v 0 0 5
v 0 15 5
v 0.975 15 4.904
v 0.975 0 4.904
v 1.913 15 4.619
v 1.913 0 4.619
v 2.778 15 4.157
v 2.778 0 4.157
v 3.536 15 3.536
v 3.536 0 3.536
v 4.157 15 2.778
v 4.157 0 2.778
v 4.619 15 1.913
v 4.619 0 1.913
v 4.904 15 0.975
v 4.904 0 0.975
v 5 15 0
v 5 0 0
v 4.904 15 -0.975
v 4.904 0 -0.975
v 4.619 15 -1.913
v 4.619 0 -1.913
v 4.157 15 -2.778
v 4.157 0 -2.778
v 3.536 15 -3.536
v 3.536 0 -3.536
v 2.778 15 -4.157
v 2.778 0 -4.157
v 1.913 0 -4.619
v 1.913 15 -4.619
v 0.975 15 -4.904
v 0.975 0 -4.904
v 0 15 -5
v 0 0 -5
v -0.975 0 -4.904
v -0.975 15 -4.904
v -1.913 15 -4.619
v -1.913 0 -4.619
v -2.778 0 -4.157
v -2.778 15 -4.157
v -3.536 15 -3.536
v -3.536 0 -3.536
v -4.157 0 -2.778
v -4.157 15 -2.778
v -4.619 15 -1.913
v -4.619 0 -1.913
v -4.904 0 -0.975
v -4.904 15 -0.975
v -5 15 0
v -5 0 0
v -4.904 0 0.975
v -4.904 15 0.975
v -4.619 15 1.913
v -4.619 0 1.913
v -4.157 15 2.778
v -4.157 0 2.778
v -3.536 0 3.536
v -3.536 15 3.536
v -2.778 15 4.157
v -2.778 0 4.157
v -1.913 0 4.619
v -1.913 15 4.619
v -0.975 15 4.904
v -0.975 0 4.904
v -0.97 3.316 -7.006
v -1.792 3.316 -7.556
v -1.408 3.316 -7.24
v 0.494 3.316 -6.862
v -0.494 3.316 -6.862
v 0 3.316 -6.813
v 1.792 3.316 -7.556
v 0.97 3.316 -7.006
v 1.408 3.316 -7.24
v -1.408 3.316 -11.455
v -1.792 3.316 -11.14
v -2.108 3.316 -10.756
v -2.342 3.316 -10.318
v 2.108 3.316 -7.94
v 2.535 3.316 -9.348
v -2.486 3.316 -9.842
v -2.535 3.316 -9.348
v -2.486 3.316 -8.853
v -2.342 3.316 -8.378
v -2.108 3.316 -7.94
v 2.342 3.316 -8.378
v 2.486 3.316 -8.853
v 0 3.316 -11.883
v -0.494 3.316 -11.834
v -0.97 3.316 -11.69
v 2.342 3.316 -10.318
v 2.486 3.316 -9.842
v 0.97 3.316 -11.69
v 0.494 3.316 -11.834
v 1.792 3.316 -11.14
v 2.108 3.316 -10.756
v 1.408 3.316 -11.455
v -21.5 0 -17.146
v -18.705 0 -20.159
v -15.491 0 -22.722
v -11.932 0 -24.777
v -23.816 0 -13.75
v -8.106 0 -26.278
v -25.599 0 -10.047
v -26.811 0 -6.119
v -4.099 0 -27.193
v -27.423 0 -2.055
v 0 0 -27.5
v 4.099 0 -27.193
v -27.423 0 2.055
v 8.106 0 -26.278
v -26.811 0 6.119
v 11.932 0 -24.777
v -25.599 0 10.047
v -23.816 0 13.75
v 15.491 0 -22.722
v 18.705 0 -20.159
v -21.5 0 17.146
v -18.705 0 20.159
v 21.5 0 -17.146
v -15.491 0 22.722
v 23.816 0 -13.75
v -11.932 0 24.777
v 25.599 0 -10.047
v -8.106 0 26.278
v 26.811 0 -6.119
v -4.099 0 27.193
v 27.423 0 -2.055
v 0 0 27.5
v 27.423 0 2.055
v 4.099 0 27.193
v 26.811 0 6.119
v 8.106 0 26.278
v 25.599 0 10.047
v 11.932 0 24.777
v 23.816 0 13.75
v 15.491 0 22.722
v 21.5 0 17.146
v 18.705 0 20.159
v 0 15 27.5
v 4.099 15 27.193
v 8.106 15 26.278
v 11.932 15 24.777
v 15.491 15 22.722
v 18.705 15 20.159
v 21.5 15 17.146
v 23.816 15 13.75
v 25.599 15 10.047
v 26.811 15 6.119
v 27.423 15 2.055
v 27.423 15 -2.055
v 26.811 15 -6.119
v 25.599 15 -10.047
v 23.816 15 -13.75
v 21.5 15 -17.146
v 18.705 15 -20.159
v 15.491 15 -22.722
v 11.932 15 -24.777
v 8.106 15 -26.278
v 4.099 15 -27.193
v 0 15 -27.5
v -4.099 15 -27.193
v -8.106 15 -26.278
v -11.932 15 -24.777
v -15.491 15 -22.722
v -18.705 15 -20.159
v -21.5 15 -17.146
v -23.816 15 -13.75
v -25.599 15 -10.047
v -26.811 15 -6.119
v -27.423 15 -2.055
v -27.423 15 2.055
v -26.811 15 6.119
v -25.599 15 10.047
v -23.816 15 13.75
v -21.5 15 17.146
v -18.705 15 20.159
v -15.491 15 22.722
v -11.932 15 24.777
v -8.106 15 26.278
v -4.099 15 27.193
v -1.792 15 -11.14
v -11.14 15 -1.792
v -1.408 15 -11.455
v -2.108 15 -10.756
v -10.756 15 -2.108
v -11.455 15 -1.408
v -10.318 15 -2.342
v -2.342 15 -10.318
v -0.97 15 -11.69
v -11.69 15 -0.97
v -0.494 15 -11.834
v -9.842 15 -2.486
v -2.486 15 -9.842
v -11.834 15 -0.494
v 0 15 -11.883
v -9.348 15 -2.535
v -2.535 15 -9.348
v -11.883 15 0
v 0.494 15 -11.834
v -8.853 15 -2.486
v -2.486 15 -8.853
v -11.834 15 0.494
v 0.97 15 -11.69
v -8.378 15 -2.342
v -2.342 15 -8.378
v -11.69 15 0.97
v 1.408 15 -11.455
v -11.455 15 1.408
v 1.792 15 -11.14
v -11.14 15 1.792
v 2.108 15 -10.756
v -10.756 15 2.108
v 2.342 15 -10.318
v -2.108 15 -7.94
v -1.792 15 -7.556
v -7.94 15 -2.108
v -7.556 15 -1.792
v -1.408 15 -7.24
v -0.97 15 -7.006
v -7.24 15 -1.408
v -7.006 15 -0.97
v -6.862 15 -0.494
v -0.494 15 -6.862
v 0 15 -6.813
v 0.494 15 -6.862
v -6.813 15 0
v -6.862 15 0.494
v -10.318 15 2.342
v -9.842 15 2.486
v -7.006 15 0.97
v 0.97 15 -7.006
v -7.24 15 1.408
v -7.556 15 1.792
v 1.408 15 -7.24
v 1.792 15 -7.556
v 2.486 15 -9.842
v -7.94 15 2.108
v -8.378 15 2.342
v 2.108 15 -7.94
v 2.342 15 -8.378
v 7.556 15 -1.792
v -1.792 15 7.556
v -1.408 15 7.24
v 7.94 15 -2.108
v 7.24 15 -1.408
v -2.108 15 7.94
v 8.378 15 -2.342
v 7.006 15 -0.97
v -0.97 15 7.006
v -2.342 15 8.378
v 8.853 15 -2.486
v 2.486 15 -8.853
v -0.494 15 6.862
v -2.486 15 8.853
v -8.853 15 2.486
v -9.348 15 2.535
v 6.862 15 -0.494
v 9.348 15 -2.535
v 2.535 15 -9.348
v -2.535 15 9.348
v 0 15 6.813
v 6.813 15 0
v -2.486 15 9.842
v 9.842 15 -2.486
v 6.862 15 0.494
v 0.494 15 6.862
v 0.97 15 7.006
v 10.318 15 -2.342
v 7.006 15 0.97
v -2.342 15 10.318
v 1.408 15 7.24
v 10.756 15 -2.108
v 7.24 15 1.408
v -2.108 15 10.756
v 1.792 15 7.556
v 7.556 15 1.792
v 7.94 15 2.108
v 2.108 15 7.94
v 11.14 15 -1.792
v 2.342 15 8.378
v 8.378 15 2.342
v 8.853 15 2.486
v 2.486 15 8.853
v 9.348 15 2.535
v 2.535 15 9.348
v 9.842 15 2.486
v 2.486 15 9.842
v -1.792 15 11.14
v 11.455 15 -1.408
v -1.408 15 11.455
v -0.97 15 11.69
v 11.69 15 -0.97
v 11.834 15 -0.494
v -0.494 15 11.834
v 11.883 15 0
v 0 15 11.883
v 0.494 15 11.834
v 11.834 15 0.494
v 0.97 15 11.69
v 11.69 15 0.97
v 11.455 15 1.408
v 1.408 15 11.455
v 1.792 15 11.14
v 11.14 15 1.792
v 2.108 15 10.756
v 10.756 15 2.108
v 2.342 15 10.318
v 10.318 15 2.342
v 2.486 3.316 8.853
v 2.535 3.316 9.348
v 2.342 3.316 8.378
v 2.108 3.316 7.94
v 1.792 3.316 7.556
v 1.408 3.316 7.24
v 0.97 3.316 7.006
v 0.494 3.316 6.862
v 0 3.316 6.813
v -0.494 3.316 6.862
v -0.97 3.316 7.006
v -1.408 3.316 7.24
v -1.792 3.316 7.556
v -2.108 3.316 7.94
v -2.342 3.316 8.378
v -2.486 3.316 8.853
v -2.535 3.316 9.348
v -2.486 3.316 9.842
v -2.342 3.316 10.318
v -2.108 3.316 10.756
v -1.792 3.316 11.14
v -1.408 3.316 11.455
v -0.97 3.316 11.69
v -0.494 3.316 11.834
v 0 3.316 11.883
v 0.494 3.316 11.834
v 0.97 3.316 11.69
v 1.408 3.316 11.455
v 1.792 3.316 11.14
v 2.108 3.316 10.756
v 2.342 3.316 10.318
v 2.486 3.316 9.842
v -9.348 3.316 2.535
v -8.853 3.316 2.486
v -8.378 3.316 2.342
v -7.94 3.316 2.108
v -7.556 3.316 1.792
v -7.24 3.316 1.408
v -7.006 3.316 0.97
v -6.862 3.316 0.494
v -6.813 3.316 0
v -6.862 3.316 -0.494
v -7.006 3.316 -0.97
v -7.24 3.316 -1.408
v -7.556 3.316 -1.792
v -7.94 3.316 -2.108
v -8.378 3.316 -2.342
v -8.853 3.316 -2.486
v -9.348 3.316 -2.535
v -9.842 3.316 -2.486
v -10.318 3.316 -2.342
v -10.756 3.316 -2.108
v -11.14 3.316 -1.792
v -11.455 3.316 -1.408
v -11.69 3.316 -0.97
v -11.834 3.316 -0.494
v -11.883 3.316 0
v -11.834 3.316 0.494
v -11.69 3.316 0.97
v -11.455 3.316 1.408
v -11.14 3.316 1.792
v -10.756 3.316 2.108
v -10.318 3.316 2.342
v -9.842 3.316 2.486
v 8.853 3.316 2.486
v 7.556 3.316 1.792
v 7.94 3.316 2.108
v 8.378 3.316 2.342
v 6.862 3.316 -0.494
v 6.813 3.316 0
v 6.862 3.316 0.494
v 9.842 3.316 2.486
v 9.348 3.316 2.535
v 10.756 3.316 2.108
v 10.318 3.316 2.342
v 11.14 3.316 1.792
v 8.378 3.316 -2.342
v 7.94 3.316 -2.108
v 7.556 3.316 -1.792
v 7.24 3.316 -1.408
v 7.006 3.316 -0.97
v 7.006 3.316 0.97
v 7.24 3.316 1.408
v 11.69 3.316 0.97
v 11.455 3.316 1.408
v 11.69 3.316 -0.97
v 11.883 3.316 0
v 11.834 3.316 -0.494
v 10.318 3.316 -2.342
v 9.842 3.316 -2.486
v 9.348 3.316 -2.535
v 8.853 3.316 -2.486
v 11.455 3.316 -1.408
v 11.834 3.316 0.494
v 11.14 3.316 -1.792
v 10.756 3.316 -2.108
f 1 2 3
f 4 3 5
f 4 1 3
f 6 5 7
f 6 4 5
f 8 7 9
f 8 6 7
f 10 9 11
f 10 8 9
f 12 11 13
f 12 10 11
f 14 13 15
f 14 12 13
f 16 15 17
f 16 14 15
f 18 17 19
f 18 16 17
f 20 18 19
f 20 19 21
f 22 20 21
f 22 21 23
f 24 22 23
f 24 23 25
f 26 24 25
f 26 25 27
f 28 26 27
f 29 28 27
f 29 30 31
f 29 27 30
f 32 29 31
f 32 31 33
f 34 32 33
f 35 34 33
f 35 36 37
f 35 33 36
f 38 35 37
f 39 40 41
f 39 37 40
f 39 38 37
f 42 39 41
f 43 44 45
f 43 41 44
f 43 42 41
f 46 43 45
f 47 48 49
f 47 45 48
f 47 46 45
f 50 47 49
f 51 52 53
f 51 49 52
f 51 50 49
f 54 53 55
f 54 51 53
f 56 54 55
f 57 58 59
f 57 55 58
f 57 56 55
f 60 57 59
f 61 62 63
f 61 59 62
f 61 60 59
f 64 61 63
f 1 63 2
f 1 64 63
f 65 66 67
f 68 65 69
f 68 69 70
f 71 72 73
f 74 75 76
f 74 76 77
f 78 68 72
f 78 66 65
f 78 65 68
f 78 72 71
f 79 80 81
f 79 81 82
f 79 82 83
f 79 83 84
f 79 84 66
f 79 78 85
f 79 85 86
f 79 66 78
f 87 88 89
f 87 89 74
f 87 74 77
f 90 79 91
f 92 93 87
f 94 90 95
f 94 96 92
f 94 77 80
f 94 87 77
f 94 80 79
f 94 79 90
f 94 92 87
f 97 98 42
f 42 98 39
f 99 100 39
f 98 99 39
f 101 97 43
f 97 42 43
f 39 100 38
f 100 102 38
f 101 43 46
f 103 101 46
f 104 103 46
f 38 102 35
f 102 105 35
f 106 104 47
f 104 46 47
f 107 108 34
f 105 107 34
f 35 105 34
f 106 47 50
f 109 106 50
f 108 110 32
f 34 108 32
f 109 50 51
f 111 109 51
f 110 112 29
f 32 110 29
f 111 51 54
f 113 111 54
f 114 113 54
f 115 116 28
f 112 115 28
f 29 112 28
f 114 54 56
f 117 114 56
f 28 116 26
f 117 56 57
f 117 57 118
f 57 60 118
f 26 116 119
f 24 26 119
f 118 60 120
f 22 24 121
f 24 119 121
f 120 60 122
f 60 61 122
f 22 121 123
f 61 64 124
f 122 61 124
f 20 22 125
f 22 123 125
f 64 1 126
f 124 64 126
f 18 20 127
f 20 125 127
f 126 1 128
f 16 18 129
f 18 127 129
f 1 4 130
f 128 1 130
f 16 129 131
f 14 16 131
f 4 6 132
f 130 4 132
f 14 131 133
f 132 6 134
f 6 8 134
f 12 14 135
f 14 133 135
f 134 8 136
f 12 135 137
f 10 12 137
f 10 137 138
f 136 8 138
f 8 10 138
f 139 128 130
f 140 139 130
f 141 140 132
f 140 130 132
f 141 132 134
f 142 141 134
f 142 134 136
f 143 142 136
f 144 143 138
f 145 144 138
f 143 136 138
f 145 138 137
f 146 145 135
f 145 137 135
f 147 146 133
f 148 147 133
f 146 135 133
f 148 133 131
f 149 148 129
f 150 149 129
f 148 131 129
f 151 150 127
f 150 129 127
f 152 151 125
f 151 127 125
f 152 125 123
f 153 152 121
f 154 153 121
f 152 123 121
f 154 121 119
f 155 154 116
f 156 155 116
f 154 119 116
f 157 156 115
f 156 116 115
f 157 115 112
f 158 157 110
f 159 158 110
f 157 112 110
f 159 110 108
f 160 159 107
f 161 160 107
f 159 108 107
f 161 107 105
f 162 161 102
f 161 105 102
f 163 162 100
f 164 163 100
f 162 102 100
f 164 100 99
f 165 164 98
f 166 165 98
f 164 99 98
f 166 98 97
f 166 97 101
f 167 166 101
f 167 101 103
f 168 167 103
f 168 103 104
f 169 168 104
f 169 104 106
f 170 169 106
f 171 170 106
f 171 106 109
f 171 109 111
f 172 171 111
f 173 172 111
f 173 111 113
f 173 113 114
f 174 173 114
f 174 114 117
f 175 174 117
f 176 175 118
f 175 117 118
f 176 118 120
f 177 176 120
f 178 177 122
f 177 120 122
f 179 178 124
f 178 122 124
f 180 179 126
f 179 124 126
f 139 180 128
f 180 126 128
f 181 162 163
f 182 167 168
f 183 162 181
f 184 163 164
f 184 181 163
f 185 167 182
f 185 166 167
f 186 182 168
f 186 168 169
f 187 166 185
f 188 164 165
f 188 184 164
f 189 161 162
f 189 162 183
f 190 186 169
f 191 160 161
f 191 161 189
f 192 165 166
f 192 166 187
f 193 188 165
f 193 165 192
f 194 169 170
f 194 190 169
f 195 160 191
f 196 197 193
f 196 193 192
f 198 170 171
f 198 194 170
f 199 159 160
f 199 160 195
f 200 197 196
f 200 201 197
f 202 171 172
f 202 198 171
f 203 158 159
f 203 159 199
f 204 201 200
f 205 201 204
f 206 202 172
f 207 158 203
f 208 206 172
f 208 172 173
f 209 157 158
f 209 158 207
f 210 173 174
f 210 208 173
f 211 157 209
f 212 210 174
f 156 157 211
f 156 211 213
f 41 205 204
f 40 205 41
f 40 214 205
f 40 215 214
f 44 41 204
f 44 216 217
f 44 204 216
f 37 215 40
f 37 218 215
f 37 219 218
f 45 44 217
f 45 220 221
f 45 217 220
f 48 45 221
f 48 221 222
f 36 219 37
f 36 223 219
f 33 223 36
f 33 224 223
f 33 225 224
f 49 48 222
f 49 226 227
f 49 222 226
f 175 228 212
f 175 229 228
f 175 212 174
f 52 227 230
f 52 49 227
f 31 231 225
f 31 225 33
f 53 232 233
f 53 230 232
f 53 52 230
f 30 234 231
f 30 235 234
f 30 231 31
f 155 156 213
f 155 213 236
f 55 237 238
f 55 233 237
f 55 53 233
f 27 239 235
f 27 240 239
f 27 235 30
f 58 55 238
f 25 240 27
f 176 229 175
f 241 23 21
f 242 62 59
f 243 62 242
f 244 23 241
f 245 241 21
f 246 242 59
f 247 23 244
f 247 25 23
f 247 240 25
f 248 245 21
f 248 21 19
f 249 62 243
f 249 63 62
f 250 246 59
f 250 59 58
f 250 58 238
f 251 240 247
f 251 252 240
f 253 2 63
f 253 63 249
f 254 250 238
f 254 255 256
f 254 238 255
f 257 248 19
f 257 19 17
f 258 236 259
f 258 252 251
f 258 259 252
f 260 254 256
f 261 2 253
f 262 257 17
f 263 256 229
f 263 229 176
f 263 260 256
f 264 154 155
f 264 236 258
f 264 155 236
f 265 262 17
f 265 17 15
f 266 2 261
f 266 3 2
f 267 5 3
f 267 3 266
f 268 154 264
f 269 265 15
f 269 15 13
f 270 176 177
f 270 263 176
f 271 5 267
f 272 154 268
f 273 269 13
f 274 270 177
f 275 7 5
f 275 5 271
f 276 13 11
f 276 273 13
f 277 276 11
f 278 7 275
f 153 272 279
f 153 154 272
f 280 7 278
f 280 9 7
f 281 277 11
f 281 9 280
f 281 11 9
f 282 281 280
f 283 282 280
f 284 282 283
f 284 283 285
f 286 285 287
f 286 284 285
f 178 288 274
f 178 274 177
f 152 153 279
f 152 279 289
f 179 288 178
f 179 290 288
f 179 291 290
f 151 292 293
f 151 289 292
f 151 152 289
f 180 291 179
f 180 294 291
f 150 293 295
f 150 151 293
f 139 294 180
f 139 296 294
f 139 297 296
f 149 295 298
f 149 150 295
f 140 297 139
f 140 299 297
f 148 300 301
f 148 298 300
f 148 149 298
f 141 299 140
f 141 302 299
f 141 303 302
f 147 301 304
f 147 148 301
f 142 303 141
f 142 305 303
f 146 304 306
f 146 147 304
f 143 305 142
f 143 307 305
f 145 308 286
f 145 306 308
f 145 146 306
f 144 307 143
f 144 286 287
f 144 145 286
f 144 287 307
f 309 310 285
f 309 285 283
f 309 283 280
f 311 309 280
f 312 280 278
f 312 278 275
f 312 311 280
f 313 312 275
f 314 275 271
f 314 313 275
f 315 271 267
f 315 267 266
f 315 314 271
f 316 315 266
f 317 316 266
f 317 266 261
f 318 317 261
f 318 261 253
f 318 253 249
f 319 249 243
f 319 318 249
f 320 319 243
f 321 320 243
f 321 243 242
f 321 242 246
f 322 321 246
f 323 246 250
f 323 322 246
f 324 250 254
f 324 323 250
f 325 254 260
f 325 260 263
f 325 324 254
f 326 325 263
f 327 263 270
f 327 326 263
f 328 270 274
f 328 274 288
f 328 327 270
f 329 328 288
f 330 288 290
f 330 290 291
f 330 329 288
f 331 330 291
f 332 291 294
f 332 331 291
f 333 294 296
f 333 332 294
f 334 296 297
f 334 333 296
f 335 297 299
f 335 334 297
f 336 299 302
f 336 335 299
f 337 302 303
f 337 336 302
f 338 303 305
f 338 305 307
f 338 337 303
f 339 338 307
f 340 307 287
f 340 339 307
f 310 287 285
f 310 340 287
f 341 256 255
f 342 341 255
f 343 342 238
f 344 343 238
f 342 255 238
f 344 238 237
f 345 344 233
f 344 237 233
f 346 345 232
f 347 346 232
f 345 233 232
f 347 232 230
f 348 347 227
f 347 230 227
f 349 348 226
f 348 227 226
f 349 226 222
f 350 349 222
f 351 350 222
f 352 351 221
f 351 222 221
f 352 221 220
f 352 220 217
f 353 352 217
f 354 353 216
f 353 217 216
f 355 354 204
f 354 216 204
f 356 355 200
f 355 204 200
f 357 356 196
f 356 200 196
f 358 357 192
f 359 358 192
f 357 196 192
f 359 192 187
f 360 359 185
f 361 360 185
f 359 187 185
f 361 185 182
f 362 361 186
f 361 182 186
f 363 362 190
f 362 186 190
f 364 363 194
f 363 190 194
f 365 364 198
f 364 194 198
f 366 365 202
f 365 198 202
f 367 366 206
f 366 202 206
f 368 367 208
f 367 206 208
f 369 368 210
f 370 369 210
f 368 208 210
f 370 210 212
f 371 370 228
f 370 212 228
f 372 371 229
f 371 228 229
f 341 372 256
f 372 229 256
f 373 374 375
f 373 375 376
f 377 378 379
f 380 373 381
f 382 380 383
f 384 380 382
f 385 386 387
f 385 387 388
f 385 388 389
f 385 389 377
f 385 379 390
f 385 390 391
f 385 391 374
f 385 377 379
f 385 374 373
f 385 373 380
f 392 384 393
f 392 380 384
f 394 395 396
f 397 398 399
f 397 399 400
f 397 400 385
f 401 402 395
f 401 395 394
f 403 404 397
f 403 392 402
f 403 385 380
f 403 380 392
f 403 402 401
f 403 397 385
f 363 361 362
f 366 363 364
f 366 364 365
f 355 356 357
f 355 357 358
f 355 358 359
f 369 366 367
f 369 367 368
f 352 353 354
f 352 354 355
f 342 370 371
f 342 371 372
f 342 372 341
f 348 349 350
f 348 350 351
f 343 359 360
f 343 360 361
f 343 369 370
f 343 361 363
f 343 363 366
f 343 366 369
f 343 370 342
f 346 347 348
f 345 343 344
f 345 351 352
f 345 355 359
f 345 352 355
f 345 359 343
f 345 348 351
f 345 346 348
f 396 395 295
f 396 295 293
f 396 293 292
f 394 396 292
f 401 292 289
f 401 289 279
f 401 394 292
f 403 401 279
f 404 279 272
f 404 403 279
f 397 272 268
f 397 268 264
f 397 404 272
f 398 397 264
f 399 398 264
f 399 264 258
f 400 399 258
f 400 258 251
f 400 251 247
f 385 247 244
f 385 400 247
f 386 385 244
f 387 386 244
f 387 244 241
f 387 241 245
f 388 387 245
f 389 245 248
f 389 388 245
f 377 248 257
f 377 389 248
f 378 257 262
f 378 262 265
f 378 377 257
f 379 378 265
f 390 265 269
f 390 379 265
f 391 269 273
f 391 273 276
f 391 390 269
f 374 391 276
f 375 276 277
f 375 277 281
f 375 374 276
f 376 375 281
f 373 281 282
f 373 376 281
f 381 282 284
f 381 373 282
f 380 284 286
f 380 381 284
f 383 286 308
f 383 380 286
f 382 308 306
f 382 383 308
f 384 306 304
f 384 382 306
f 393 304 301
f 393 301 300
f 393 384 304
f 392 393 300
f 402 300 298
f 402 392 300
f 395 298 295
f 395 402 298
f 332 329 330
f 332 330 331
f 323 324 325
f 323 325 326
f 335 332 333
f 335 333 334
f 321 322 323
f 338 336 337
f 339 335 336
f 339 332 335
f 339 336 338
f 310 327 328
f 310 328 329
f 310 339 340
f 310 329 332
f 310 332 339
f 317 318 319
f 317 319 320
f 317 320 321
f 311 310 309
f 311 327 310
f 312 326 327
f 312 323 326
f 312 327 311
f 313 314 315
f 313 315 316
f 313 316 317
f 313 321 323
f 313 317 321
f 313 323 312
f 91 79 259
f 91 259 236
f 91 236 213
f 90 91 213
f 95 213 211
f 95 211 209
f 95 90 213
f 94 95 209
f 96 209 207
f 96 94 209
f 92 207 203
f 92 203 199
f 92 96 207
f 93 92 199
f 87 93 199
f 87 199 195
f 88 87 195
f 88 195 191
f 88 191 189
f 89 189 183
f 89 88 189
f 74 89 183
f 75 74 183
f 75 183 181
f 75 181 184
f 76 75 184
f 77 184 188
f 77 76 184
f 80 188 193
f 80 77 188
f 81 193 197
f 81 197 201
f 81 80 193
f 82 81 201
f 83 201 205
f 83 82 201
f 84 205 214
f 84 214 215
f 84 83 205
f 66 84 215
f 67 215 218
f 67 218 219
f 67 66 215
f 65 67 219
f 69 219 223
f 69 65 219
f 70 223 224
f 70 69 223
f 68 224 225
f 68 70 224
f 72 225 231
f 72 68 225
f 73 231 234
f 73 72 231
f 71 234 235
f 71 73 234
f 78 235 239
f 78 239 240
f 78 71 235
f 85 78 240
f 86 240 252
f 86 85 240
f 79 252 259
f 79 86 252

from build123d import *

# Parameters (mm, degrees)
SKETCH1_R           = 27.5
BOSS_EXTRUDE1_DEPTH = 15
SKETCH2_R           = 5
CUT_EXTRUDE1_DEPTH  = 42.683330001
SKETCH3_R           = 2.534672143
CUT_EXTRUDE2_DEPTH  = 11.683898907
CIRPATTERN1_COUNT   = 4


with BuildPart() as part:
    # Sketch1 → Boss-Extrude1 (new body)
    with BuildSketch(Plane(origin=(0, 0, 0), x_dir=(1, 0, 0), z_dir=(0, 1, 0))):
        Circle(SKETCH1_R)
    extrude(amount=BOSS_EXTRUDE1_DEPTH)

    # Sketch2 → Cut-Extrude1 (cut, through all)
    with BuildSketch(Plane(origin=(0, 0, 0), x_dir=(1, 0, 0), z_dir=(0, 1, 0))):
        Circle(SKETCH2_R)
    extrude(amount=CUT_EXTRUDE1_DEPTH, mode=Mode.SUBTRACT)

    # Sketch3 → Cut-Extrude2 (cut)
    with BuildSketch(Plane(origin=(0, 15, 0), x_dir=(1, 0, 0), z_dir=(0, 1, 0))):
        with Locations((-9.347834619, 0)):
            Circle(SKETCH3_R)
    cut_extrude2 = extrude(amount=-CUT_EXTRUDE2_DEPTH, mode=Mode.SUBTRACT)

    # CirPattern1: Cut-Extrude2 ×4 about axis
    cirpattern1_axis = Axis((0, 0, 0), (0, 1, 0))
    for i in range(1, CIRPATTERN1_COUNT):
        add(cut_extrude2.rotate(cirpattern1_axis, i * 360 / CIRPATTERN1_COUNT), mode=Mode.SUBTRACT)


solid = part.part
